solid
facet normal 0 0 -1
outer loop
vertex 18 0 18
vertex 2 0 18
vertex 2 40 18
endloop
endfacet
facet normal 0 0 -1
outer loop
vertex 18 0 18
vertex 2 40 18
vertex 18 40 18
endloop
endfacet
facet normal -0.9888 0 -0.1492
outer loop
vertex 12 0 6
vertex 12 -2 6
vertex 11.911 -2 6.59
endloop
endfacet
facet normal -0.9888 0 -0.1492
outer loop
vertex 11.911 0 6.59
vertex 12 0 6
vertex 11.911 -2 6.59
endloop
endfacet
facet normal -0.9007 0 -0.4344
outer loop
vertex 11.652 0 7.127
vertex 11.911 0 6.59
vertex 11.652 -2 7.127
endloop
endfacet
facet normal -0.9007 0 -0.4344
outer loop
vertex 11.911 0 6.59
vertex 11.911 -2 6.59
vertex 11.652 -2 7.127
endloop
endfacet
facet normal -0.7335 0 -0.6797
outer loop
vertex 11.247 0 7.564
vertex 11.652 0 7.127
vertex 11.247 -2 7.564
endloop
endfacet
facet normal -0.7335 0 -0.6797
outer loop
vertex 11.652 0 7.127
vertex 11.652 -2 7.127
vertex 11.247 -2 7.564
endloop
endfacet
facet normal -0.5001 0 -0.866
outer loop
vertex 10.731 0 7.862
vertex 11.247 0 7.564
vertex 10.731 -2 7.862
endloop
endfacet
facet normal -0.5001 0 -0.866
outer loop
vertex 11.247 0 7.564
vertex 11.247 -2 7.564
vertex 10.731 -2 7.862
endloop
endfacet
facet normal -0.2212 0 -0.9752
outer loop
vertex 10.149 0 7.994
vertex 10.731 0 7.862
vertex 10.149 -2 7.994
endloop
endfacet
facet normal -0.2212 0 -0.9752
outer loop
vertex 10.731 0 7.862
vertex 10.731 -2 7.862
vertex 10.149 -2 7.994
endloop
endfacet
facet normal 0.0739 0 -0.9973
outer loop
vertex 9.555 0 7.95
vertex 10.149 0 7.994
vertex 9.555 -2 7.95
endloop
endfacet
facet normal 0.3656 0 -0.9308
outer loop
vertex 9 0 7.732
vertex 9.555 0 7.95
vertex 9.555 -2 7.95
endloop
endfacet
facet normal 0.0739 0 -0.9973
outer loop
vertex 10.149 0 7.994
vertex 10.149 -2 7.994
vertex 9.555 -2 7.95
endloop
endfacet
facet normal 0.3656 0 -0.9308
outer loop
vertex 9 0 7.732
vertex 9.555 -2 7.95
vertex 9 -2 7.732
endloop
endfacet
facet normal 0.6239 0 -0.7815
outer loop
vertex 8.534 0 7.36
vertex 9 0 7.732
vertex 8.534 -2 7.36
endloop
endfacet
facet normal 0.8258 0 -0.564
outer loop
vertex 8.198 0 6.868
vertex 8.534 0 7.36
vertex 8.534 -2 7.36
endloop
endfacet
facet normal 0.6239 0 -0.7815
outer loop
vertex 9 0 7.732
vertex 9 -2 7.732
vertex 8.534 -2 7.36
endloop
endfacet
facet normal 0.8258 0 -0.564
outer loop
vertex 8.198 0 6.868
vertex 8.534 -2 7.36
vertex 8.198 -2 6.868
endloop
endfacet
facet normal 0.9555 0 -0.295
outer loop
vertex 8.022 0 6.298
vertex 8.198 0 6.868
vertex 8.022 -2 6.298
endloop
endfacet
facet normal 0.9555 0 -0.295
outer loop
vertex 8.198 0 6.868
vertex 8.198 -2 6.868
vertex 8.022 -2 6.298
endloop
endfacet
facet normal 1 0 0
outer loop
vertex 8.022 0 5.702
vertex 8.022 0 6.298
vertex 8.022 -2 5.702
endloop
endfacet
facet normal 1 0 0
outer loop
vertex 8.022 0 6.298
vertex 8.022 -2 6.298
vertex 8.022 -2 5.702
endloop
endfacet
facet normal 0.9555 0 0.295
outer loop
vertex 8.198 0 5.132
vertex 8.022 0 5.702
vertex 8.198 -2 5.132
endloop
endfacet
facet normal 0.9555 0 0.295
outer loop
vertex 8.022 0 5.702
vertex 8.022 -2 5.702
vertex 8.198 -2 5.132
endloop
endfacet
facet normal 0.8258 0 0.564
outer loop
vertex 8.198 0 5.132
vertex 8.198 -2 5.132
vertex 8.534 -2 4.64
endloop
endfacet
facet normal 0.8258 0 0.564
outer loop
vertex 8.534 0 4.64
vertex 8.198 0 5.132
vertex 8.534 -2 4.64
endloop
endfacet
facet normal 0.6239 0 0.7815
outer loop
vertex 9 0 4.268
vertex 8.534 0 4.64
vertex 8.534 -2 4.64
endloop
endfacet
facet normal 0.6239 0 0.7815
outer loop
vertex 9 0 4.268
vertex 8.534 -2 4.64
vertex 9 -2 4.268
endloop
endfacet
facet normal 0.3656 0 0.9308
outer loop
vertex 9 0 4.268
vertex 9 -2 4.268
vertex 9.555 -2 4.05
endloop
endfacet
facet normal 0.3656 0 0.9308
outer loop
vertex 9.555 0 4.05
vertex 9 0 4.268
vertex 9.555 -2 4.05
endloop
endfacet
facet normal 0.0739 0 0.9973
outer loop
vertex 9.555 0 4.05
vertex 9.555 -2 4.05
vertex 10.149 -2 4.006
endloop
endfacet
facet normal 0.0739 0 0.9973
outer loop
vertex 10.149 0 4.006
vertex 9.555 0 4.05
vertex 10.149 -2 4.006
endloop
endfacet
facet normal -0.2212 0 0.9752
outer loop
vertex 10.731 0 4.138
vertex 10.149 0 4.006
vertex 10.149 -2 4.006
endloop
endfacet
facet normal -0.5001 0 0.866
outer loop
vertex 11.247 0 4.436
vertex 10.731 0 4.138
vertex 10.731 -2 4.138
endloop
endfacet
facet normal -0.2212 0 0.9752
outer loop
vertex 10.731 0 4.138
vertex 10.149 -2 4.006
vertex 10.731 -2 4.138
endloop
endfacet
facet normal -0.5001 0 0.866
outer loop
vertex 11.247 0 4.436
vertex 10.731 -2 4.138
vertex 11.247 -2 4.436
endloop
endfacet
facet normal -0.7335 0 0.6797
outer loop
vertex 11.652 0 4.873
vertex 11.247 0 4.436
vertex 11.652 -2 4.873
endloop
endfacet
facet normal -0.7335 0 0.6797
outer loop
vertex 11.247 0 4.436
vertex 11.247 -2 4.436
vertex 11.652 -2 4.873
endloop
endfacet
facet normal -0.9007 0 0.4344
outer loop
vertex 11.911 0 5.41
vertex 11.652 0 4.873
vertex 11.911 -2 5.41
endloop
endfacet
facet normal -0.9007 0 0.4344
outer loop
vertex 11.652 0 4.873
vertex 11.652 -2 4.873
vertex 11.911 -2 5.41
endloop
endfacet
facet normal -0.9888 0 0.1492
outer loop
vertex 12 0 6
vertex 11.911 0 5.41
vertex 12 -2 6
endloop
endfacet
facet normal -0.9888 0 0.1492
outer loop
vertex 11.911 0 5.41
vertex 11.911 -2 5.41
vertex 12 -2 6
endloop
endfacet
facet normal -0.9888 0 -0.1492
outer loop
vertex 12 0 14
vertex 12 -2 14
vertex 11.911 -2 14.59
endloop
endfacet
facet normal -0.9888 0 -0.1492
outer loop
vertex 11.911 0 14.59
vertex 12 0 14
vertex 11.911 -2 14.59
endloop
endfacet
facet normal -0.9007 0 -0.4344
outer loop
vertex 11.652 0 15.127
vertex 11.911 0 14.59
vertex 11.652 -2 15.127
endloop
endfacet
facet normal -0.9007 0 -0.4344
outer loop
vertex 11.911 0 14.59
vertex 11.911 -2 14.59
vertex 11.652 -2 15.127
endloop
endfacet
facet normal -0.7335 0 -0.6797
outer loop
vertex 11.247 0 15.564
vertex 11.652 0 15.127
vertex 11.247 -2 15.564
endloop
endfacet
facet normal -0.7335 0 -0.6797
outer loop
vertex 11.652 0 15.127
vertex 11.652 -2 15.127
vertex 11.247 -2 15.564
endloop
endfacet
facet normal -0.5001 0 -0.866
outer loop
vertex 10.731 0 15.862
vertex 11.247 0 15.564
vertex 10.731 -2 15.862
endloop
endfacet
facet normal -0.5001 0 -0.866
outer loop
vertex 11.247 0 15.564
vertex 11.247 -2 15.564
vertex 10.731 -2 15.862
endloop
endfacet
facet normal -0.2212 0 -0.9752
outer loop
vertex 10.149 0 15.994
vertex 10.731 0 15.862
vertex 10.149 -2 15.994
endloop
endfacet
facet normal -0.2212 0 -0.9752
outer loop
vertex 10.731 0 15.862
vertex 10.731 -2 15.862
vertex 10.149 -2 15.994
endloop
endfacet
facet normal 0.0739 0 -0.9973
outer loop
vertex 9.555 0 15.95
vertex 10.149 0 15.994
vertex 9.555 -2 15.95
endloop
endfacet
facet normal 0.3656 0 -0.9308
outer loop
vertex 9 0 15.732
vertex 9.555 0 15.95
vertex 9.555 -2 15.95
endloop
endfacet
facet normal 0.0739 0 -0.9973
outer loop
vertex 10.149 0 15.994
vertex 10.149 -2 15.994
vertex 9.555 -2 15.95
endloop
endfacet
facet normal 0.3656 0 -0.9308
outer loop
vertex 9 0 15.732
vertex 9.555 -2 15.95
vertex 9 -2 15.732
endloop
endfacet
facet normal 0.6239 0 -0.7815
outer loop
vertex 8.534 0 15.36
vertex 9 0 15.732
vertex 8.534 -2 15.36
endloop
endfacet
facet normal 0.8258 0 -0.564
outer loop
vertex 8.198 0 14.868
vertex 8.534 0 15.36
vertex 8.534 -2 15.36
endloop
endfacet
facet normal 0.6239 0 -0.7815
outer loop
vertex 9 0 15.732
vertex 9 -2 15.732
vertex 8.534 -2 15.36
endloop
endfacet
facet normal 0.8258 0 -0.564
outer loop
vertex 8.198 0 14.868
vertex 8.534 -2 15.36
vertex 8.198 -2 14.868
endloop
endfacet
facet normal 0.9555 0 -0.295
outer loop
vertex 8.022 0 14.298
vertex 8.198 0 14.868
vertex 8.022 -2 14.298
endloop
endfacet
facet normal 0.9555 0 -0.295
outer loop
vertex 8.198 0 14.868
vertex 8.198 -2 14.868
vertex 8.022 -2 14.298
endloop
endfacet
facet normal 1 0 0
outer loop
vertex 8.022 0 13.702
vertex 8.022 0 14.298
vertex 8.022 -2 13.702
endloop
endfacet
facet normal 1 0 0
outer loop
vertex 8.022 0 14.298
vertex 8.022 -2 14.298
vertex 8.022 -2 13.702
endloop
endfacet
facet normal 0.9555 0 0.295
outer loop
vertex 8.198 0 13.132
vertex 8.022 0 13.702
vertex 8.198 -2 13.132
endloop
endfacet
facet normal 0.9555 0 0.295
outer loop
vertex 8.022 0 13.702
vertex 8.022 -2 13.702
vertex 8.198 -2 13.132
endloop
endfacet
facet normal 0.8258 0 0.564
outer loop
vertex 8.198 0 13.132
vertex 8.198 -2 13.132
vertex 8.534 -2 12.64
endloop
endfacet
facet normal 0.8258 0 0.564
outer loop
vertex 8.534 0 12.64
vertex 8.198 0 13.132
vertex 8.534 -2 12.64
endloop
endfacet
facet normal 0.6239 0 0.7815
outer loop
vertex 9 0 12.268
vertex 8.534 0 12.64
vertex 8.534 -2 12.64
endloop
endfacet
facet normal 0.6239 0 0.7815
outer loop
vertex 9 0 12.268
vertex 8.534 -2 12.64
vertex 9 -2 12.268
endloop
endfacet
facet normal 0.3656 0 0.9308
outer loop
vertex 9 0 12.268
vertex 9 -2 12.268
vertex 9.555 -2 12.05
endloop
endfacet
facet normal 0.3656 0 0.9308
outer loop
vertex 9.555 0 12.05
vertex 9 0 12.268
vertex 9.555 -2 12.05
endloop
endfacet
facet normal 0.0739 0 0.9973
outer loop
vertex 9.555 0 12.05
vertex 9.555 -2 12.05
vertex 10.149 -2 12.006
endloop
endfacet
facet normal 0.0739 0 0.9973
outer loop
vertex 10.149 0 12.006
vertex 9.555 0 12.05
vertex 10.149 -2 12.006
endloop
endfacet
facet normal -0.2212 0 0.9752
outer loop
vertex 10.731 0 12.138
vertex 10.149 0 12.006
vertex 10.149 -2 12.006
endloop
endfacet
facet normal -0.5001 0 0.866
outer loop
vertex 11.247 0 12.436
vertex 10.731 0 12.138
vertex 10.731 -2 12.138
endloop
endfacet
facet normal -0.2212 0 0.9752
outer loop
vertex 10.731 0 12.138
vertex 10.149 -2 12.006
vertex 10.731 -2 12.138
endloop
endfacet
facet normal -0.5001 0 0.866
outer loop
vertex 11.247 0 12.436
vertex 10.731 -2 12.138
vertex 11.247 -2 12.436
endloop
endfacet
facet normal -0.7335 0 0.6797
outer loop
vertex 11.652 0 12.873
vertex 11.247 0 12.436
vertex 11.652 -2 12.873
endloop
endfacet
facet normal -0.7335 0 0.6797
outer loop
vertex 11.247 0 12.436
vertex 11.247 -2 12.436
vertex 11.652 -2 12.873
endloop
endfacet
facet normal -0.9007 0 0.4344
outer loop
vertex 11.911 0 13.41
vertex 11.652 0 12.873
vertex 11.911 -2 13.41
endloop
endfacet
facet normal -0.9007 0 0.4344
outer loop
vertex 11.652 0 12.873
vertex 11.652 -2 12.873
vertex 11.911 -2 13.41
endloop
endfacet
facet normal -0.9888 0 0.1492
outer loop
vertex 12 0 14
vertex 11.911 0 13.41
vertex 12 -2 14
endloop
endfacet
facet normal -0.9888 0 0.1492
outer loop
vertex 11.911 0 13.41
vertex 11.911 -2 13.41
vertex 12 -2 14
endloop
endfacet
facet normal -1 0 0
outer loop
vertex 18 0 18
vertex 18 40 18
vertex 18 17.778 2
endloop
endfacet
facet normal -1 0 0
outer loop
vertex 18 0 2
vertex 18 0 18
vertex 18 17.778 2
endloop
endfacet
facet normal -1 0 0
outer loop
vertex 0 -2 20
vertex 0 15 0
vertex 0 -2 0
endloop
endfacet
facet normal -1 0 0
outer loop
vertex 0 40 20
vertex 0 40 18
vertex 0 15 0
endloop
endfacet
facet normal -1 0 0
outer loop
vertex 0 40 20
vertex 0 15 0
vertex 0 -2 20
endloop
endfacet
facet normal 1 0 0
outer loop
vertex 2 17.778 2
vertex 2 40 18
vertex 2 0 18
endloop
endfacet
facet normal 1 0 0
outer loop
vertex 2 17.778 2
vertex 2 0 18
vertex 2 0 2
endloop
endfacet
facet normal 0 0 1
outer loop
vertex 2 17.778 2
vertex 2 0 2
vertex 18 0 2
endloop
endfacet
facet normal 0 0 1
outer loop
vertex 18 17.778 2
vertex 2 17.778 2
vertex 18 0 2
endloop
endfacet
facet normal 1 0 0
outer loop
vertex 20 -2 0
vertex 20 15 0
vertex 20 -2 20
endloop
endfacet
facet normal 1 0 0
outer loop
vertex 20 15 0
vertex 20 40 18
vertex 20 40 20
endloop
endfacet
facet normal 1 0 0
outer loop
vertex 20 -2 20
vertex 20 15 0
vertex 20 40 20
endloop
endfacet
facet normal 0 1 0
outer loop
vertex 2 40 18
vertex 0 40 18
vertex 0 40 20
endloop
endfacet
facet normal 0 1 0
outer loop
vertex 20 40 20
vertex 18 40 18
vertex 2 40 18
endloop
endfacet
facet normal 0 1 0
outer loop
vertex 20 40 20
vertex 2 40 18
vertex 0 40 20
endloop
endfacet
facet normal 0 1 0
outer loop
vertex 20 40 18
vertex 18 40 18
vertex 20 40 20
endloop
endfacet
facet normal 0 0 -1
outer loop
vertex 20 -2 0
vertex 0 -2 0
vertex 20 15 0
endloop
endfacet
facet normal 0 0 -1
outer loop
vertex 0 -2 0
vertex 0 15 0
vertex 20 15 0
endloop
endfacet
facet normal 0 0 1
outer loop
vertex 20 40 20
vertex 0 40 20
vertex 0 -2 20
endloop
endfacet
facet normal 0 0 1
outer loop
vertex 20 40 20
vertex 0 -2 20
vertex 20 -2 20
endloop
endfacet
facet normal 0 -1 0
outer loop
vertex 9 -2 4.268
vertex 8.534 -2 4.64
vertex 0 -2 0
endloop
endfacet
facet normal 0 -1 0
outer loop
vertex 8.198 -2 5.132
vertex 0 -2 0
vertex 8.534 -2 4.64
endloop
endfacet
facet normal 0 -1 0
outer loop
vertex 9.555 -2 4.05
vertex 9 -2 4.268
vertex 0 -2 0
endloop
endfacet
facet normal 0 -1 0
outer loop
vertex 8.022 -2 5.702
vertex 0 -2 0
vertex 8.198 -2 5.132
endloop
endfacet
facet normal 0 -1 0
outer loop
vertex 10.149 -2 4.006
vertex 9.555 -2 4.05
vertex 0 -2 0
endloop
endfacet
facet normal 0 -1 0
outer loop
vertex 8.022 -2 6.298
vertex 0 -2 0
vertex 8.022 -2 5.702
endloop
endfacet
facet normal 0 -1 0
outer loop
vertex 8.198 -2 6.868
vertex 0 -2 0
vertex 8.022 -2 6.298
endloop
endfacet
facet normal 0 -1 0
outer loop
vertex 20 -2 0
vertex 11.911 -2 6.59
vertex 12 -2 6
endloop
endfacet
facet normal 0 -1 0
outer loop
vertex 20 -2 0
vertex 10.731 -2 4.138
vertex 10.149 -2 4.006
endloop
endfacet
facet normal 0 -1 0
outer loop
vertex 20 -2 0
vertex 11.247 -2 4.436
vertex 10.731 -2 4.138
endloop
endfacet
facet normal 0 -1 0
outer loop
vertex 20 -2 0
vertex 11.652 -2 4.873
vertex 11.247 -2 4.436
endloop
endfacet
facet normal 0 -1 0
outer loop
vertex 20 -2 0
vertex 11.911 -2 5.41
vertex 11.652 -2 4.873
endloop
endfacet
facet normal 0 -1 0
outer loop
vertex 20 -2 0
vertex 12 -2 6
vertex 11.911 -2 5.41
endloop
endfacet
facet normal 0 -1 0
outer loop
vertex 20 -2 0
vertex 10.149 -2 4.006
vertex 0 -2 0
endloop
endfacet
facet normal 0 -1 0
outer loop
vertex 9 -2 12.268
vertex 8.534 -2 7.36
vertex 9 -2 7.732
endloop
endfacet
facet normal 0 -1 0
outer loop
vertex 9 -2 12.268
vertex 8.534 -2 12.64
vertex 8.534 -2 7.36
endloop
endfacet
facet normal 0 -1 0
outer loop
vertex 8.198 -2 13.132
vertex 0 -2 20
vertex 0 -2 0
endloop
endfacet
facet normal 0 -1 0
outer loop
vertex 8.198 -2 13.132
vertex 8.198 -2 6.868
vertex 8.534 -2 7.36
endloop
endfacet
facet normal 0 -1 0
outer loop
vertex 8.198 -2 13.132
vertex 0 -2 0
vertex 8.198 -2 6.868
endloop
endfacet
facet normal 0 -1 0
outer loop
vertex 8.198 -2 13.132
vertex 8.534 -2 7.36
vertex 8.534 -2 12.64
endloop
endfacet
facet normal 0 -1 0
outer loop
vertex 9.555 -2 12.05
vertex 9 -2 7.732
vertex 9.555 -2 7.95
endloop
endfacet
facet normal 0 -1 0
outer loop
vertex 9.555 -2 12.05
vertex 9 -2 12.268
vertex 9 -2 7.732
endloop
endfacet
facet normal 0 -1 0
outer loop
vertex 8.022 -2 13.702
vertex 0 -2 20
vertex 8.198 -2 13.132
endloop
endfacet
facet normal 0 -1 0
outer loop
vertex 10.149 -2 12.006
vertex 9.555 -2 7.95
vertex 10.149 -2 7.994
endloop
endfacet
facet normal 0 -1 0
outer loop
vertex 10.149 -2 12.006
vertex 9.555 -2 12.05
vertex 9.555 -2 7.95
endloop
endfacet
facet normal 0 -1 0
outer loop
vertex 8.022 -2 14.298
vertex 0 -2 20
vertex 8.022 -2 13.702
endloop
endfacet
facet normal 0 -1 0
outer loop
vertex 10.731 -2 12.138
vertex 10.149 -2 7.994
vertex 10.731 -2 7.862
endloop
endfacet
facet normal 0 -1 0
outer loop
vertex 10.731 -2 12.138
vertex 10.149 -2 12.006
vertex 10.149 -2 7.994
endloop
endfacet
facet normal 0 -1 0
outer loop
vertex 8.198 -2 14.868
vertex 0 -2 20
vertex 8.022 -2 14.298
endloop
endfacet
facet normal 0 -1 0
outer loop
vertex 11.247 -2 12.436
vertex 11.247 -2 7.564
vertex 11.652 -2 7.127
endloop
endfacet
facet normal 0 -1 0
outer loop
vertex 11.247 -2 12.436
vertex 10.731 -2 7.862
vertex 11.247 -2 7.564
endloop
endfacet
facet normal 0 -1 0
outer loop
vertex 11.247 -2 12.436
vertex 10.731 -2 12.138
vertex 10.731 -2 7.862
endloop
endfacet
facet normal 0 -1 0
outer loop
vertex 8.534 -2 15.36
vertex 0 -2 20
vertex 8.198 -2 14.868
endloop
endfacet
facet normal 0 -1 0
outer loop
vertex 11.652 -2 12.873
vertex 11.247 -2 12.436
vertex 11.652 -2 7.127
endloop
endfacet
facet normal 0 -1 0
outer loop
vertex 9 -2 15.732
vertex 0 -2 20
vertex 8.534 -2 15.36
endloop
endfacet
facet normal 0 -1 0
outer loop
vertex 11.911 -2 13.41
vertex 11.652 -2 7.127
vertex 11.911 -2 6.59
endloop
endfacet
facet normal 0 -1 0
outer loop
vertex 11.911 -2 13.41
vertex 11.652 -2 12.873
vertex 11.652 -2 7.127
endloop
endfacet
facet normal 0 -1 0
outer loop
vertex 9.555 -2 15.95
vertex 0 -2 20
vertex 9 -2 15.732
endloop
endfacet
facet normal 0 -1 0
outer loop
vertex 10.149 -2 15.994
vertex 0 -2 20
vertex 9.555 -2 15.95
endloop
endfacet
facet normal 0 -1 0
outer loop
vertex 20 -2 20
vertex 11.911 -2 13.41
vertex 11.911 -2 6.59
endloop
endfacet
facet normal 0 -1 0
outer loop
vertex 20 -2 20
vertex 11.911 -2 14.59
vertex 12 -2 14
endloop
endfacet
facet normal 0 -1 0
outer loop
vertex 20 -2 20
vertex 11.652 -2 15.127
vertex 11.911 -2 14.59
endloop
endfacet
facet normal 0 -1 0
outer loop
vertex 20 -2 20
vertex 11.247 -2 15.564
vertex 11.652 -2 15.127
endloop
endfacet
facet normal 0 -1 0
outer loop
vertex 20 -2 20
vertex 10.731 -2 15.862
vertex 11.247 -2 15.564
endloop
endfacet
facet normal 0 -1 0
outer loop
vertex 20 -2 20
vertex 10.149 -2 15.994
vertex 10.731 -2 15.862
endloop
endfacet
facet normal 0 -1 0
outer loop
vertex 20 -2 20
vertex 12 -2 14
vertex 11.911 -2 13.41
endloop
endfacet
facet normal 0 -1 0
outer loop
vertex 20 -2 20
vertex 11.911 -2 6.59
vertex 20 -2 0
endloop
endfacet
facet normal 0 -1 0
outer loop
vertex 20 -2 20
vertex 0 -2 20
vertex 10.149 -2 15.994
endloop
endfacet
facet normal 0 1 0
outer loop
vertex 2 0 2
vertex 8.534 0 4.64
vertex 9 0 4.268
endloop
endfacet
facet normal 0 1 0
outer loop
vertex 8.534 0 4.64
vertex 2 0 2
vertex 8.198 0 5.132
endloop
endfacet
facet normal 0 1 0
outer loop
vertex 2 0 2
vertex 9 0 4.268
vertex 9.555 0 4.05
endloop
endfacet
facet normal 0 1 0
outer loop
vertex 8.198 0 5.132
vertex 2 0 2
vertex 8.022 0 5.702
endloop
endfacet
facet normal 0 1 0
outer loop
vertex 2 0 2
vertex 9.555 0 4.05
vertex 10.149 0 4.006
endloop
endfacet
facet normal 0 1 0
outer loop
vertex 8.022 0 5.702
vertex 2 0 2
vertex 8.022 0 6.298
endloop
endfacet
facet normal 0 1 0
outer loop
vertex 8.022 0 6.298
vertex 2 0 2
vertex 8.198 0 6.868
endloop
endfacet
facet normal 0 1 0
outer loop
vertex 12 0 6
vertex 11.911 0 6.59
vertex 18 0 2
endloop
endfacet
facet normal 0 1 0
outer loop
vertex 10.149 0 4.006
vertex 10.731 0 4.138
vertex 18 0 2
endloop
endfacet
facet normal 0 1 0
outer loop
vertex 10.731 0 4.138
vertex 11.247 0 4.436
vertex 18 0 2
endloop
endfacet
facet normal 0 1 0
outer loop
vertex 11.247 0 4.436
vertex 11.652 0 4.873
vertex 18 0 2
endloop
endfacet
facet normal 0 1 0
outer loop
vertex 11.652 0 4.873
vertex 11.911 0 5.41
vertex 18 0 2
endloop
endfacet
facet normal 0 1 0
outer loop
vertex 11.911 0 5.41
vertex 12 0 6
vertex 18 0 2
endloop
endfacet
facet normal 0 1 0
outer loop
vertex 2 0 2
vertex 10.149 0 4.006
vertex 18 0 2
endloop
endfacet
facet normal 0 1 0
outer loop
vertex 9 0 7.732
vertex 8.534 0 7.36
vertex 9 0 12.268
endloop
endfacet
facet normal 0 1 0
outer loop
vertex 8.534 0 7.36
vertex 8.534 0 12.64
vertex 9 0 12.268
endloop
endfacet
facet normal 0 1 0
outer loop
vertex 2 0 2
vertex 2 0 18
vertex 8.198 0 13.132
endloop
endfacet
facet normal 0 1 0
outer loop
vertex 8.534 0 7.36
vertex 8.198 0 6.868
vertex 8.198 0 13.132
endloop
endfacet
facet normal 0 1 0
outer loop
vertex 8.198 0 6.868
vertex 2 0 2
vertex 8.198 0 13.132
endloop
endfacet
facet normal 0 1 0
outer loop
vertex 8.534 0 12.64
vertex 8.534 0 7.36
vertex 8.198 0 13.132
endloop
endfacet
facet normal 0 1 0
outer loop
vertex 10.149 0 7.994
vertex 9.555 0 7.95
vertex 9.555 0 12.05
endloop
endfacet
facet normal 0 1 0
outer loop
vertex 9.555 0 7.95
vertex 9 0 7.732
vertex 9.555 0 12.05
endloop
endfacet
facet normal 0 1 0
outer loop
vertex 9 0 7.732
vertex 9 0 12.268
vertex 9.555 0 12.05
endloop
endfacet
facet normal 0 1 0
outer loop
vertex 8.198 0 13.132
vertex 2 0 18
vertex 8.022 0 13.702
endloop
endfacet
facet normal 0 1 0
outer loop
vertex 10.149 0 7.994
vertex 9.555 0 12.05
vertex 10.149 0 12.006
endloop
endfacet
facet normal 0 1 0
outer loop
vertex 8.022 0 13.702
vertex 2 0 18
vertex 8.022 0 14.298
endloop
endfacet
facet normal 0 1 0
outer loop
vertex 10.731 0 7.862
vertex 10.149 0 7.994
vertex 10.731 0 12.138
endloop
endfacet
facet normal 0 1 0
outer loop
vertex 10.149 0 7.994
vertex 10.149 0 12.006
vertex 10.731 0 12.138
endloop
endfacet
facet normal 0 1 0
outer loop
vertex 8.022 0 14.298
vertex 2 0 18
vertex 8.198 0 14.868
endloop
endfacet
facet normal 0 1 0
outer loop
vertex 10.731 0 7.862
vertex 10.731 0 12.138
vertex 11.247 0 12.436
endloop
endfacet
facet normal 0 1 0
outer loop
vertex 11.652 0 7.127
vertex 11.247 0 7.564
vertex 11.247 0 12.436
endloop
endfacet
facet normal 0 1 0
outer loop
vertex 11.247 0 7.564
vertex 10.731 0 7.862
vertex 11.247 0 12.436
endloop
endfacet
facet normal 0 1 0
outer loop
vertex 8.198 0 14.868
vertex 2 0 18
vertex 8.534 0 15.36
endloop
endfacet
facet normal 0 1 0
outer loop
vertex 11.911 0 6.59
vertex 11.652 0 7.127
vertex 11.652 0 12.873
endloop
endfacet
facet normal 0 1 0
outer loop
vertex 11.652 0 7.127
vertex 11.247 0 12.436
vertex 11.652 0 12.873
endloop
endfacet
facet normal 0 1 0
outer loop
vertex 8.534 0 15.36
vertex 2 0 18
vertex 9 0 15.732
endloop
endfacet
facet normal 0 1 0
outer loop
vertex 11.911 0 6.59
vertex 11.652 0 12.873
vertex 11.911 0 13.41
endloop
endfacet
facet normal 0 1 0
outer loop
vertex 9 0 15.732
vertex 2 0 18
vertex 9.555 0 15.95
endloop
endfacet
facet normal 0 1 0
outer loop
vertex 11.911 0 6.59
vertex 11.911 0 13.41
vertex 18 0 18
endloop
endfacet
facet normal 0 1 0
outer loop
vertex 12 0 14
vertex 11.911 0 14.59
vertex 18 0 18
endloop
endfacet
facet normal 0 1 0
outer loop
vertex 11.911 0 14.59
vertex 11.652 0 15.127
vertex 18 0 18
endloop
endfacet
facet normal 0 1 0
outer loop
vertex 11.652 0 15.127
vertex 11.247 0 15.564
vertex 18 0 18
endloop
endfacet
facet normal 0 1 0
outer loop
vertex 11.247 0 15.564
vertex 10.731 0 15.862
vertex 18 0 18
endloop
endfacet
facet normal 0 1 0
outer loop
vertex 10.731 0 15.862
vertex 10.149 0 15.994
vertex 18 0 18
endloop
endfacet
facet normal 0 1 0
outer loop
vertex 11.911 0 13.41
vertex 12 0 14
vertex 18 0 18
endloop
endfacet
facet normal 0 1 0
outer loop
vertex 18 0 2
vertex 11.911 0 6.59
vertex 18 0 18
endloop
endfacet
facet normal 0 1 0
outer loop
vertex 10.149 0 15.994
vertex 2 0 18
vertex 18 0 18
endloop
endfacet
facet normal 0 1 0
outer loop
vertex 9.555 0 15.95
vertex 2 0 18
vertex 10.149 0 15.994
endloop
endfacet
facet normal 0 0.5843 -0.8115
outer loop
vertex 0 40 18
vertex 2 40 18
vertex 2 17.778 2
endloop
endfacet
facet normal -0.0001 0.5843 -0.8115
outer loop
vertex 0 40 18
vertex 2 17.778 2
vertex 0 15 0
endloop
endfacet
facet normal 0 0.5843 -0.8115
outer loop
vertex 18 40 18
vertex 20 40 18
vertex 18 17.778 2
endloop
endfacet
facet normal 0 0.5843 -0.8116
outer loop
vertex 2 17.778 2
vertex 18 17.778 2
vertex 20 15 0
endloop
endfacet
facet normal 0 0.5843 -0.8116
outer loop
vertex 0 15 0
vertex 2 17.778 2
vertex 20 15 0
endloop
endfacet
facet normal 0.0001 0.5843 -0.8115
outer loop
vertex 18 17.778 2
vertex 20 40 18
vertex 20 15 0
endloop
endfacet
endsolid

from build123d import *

# Parameters (mm, degrees)
SZKIC1_W                        = 20
SZKIC1_H                        = 20
SZKIC1_W_2                      = 16
SZKIC1_H_2                      = 16
DODANIE_WYCI_GNI_CIE1_DEPTH     = 40
WYTNIJ_WYCI_GNI_CIE1_DEPTH      = 1
WYTNIJ_WYCI_GNI_CIE1_DEPTH_BACK = 21
SZKIC3_W                        = 20
SZKIC3_H                        = 20
DODANIE_WYCI_GNI_CIE2_DEPTH     = 2
SZKIC4_R                        = 2
WYTNIJ_WYCI_GNI_CIE2_DEPTH      = 2


with BuildPart() as part:
    # Szkic1 → Dodanie-wyciągnięcie1 (new body)
    with BuildSketch(Plane(origin=(0, 0, 0), x_dir=(1, 0, 0), z_dir=(0, 1, 0))):
        with Locations((10, -10)):
            Rectangle(SZKIC1_W, SZKIC1_H)
        with Locations((10, -10)):
            Rectangle(SZKIC1_W_2, SZKIC1_H_2, mode=Mode.SUBTRACT)
    extrude(amount=DODANIE_WYCI_GNI_CIE1_DEPTH)

    # Szkic2 → Wytnij-wyciągnięcie1 (cut, two sides)
    with BuildSketch(Plane(origin=(20, 0, 0), x_dir=(0, 0, -1), z_dir=(1, 0, 0))) as wytnij_wyci_gni_cie1_sk:
        Polygon((-18, 40), (0, 15), (0, 40), align=None)
    extrude(amount=WYTNIJ_WYCI_GNI_CIE1_DEPTH, mode=Mode.SUBTRACT)
    extrude(wytnij_wyci_gni_cie1_sk.sketch, amount=-WYTNIJ_WYCI_GNI_CIE1_DEPTH_BACK, mode=Mode.SUBTRACT)

    # Szkic3 → Dodanie-wyciągnięcie2 (add)
    with BuildSketch(Plane.XZ):
        with Locations((10, 10)):
            Rectangle(SZKIC3_W, SZKIC3_H)
    extrude(amount=DODANIE_WYCI_GNI_CIE2_DEPTH)

    # Szkic4 → Wytnij-wyciągnięcie2 (cut)
    with BuildSketch(Plane.XZ.offset(2)):
        with Locations((10, 14)):
            Circle(SZKIC4_R)
        with Locations((10, 6)):
            Circle(SZKIC4_R)
    extrude(amount=-WYTNIJ_WYCI_GNI_CIE2_DEPTH, mode=Mode.SUBTRACT)


solid = part.part
